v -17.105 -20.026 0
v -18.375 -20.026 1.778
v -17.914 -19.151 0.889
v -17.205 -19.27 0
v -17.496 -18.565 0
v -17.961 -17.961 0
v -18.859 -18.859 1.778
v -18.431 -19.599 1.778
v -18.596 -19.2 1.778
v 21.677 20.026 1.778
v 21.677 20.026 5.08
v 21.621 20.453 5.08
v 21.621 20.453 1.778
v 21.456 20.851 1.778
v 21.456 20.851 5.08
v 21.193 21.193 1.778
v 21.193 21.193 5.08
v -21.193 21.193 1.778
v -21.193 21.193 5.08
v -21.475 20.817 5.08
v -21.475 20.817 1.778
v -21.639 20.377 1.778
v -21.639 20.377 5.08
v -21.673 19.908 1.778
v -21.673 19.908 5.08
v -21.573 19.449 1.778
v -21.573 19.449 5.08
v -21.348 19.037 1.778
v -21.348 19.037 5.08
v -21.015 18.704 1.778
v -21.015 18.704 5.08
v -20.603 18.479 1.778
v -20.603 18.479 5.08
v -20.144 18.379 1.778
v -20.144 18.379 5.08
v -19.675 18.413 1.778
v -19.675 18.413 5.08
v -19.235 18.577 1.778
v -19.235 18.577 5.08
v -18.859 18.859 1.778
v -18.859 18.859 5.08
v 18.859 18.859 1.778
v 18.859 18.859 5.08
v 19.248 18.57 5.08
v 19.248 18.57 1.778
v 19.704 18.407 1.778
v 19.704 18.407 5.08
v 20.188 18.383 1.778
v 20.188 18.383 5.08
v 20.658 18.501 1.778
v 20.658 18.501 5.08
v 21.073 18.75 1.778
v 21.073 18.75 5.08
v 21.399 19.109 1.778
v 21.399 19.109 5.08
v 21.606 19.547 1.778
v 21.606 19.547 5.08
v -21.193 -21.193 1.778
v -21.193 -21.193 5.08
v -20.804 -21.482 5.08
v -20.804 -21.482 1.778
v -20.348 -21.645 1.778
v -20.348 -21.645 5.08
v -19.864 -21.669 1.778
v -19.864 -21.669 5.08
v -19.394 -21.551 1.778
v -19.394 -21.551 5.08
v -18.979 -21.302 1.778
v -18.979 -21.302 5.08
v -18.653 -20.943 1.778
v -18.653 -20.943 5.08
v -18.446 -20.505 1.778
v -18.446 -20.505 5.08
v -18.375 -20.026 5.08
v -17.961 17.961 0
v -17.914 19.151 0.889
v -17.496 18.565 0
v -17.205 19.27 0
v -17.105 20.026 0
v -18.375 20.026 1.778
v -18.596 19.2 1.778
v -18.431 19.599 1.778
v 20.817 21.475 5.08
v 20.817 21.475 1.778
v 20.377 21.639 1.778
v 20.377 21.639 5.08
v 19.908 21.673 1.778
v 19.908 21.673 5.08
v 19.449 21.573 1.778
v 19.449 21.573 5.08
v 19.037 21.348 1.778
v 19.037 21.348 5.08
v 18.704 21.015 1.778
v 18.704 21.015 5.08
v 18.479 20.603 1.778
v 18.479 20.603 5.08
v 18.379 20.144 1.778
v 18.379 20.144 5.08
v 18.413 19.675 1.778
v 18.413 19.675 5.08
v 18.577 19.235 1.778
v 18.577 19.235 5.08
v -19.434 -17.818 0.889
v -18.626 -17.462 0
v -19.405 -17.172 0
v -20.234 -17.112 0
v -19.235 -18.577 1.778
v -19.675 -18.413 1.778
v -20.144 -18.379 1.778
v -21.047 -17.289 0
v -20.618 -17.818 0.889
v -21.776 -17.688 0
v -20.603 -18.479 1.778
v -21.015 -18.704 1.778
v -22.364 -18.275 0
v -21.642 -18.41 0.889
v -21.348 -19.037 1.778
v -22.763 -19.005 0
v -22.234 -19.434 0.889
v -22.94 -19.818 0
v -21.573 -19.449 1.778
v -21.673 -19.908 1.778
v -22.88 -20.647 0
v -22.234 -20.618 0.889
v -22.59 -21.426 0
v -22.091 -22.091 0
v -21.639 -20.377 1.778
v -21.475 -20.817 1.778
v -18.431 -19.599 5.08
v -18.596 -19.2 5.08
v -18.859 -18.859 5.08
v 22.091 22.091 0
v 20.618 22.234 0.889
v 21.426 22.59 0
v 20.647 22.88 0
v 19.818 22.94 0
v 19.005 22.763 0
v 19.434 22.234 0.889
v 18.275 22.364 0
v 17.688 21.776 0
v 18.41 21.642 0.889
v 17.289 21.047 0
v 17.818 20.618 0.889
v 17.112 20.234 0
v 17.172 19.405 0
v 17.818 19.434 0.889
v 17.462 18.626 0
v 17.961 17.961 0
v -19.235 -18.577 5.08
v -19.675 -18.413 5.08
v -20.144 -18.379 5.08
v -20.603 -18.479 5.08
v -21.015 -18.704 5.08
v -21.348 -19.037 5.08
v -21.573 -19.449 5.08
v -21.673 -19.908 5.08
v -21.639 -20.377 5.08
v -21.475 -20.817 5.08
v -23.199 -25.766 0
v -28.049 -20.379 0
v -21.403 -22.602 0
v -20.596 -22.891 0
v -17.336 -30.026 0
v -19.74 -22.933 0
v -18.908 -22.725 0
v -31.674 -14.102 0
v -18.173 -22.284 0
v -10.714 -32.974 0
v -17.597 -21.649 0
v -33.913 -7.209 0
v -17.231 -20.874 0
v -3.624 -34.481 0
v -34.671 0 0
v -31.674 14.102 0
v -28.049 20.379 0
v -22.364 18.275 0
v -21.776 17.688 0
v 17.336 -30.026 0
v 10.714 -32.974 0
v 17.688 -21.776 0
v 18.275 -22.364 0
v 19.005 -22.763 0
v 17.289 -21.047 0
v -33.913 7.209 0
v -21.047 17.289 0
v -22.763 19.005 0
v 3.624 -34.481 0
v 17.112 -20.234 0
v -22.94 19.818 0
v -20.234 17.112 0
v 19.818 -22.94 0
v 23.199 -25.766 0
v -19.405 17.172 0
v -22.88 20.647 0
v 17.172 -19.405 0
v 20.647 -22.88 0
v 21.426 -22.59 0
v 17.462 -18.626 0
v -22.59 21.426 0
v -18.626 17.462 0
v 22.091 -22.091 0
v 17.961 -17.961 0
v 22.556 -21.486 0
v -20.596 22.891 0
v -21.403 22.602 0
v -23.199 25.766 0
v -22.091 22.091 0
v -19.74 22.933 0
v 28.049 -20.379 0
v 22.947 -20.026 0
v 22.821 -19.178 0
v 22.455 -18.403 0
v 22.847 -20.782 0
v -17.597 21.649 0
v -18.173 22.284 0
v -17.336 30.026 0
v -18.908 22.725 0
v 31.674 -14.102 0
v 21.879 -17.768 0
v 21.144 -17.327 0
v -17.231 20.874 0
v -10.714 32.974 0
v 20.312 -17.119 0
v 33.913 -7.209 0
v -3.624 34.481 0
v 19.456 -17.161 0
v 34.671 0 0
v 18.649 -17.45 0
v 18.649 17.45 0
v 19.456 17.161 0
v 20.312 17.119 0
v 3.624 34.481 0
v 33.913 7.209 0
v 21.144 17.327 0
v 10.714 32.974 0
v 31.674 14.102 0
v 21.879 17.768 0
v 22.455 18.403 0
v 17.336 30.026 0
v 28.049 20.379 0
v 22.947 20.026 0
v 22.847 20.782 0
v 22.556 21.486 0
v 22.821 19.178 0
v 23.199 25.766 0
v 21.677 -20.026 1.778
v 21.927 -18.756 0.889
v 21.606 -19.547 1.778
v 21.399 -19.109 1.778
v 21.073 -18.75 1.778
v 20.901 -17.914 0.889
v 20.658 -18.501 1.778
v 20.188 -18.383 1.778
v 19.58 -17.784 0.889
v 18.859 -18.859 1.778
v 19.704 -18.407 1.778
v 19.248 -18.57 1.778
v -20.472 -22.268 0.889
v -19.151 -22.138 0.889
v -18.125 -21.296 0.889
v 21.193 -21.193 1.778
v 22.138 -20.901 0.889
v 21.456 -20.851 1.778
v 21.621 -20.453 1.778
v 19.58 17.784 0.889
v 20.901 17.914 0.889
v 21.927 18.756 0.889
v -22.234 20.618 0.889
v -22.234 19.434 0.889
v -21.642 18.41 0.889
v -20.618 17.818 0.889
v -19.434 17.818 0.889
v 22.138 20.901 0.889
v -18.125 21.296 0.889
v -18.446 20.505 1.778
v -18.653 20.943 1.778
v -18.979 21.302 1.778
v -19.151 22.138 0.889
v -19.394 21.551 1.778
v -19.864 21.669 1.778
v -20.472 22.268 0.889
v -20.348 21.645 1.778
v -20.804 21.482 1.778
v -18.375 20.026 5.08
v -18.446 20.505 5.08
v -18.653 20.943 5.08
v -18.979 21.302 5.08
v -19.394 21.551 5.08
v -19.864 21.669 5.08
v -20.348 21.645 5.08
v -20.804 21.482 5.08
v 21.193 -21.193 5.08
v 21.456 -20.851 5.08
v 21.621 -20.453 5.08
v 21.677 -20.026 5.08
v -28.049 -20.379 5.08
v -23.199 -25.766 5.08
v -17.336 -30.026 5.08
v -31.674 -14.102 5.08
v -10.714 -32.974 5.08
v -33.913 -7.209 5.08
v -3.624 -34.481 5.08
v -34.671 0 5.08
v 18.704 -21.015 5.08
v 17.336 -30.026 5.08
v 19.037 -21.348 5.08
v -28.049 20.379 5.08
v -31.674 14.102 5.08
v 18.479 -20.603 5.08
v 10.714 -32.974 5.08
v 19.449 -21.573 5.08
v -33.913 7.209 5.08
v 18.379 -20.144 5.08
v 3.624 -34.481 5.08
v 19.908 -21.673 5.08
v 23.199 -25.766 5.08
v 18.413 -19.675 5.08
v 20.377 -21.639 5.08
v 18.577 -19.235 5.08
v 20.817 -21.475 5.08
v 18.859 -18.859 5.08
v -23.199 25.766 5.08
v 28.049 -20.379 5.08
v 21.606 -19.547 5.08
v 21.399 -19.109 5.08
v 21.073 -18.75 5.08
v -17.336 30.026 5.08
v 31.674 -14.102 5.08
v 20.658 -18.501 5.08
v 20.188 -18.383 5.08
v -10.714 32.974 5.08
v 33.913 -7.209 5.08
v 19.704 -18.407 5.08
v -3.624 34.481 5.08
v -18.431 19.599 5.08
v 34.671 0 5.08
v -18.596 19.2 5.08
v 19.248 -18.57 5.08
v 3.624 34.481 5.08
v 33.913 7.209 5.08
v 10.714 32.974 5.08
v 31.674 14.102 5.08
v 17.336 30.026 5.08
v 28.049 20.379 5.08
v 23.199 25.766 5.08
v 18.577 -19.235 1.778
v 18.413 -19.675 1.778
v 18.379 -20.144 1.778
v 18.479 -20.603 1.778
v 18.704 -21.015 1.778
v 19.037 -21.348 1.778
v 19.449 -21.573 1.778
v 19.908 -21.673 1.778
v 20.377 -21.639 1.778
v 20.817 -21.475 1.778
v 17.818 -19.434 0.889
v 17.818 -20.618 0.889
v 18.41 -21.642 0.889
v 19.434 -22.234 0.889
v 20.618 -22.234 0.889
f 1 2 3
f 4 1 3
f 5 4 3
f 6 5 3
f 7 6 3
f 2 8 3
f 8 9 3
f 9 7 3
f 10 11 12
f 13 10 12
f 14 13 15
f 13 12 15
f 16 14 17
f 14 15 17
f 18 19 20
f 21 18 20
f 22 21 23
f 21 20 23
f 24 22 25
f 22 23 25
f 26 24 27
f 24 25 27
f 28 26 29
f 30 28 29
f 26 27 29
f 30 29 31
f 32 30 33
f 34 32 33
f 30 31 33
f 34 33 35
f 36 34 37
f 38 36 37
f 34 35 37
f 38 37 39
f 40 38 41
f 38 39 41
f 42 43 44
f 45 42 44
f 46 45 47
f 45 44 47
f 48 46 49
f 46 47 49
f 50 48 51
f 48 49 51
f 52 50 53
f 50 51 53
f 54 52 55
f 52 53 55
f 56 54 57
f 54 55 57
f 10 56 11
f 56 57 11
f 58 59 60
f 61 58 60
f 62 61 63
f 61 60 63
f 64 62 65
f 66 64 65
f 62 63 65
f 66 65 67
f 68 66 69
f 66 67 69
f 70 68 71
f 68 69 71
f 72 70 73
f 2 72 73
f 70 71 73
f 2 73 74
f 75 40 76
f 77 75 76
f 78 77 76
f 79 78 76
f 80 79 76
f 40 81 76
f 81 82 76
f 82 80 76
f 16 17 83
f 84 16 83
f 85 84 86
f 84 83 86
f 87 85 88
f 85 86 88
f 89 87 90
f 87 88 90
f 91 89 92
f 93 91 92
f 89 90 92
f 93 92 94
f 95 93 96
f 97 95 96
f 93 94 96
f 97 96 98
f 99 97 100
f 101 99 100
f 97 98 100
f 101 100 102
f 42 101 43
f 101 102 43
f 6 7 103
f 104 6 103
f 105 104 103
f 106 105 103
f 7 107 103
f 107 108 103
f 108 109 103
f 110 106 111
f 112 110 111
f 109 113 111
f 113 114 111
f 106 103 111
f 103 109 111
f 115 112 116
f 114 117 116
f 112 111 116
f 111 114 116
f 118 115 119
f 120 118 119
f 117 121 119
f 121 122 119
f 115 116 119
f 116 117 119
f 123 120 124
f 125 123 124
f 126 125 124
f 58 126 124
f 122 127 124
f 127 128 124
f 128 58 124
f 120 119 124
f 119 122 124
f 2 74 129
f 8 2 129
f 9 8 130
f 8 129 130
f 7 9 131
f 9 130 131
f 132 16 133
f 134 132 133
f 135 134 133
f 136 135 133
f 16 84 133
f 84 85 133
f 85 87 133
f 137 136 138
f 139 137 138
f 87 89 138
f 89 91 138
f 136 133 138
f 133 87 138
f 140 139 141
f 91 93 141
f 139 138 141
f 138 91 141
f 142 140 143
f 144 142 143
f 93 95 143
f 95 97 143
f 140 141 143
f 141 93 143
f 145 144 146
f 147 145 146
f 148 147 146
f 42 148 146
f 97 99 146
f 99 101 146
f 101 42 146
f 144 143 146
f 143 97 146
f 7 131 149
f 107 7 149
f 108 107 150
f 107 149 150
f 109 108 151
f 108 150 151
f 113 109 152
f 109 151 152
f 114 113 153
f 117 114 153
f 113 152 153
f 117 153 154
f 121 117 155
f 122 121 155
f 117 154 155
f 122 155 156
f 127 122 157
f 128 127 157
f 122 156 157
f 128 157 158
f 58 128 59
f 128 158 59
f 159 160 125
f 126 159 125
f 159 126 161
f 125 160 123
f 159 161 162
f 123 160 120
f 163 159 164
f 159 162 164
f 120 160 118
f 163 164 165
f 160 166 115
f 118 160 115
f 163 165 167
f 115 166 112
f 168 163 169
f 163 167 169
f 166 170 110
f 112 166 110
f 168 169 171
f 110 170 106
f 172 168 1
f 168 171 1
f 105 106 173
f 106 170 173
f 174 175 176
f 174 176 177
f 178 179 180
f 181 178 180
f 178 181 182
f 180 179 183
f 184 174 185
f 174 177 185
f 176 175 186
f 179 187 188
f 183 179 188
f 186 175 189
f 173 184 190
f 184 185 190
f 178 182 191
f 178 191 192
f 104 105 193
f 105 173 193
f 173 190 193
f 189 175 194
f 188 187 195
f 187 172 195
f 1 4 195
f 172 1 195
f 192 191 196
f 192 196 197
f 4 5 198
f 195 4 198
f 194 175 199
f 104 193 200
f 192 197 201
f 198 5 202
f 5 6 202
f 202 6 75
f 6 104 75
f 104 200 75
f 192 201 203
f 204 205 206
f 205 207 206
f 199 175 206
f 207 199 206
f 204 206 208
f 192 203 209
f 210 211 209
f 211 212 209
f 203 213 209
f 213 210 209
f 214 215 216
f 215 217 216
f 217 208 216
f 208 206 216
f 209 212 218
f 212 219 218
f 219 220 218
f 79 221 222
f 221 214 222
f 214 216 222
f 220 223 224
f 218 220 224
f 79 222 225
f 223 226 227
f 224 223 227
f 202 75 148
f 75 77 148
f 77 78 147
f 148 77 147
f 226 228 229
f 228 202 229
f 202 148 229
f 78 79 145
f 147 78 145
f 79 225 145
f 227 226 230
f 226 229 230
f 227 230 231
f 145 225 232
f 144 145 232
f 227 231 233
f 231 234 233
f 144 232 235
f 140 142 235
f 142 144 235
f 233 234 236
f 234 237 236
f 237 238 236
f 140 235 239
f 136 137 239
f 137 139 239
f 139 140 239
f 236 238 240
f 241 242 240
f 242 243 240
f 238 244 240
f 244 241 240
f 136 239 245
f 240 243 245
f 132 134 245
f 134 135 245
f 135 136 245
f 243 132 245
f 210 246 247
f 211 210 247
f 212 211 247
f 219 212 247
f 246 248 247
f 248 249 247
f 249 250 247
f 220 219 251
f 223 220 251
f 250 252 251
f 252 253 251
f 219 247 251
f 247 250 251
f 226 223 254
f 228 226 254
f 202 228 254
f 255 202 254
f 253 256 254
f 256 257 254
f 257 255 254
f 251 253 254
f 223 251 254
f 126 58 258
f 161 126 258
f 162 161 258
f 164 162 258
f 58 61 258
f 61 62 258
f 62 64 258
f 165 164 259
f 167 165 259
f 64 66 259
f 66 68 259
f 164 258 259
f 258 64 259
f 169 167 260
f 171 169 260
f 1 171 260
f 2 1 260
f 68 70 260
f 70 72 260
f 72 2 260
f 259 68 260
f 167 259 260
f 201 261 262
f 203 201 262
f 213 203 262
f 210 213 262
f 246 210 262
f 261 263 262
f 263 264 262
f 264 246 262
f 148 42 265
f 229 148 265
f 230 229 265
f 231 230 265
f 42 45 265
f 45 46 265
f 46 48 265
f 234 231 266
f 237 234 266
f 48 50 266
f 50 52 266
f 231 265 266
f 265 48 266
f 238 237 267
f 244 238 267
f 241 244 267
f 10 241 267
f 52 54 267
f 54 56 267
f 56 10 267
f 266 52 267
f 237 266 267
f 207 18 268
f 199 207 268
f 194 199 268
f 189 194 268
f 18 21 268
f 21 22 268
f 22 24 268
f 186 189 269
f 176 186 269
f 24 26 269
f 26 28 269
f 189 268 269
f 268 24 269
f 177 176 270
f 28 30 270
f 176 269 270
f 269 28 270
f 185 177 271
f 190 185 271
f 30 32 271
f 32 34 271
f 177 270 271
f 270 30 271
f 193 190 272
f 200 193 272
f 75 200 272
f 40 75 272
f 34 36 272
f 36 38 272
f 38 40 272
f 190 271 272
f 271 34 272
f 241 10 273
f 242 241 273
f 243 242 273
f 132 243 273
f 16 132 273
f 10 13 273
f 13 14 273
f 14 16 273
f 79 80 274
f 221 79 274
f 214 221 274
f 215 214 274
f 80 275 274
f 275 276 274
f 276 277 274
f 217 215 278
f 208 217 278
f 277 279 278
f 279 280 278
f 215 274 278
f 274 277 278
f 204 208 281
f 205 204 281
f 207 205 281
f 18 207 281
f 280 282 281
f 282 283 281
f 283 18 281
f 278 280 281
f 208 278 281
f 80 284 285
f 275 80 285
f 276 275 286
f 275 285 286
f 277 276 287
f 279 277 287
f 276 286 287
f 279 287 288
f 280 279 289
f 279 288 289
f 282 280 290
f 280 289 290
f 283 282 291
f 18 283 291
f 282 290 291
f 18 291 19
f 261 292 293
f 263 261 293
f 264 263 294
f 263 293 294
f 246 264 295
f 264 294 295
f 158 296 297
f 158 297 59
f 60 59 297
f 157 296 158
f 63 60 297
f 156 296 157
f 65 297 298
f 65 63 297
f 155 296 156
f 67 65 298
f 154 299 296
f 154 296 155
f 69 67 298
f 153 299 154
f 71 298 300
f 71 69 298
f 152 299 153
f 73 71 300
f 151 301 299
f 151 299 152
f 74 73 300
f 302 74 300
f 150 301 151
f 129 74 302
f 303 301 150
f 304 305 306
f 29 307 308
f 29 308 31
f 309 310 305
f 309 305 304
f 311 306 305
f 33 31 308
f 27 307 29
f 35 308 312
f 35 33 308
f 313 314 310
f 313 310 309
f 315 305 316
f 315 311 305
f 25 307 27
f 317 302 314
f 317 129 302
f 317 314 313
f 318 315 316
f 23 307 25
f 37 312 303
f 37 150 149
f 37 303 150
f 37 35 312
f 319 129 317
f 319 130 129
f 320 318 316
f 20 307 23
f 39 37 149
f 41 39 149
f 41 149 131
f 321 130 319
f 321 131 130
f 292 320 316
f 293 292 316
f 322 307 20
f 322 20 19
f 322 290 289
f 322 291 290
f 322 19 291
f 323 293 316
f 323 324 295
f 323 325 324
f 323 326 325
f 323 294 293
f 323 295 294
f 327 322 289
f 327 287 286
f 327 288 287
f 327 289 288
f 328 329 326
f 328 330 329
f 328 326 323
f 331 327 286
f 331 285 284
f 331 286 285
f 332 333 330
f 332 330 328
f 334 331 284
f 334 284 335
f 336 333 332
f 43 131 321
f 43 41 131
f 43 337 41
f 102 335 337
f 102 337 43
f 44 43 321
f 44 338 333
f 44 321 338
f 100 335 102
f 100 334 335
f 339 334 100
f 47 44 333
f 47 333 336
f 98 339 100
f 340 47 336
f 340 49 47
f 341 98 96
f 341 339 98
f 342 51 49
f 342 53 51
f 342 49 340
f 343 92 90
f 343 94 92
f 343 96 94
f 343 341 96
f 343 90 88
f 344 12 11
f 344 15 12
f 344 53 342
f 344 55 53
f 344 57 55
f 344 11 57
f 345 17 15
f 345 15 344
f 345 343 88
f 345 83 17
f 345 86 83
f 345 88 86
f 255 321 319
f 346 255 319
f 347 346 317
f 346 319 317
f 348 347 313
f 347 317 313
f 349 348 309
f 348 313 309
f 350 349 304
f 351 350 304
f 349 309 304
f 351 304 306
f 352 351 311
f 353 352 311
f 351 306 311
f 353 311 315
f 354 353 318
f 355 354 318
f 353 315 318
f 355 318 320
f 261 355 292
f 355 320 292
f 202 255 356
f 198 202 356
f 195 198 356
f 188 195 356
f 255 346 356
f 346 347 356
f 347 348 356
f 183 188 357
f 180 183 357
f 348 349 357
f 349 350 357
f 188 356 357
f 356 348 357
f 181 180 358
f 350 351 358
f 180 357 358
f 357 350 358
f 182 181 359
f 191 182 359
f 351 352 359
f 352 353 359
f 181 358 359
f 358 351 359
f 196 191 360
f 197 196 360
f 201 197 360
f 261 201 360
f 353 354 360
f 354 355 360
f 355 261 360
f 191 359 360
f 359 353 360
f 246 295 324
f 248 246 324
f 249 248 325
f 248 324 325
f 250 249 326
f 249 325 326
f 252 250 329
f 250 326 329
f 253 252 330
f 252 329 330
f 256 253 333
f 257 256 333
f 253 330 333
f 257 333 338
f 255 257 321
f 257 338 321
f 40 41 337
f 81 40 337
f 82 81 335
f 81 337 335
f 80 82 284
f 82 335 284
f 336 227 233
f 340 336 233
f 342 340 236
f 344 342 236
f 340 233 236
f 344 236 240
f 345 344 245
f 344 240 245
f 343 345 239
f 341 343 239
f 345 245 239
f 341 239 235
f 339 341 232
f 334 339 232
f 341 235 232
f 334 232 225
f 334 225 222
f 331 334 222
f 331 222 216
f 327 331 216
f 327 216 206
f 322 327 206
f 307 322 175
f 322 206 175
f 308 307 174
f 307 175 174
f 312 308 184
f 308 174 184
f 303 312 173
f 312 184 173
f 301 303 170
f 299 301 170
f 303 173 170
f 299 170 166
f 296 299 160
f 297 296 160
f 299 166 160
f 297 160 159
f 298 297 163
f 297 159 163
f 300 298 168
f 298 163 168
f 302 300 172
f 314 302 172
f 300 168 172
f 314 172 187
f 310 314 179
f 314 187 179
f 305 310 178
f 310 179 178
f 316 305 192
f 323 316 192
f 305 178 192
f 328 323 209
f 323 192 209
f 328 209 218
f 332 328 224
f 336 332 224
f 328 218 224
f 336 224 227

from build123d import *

# Parameters (mm, degrees)
F0_R     = 34.671
F1_DEPTH = 5.08
F3_DEPTH = 25.4
F4_SIZE2 = 1.778
F4_SIZE  = 1.27


with BuildPart() as f1:
    # F0 (on Top) → F1 (new body)
    with BuildSketch(Plane.XY):
        Circle(F0_R)
    extrude(amount=F1_DEPTH)

    # F2 (on face) → F3 (cut)
    with BuildSketch(Plane.XY.offset(5.08)):
        with BuildLine():
            ThreePointArc((21.1934044457, 21.1934044457), (18.8585378542, 21.1934044457), (18.8585378542, 18.8585378542))
            Line((18.8585378542, 18.8585378542), (21.1934044457, 21.1934044457))
        make_face()
        with BuildLine():
            Line((21.1934044457, 21.1934044457), (18.8585378542, 18.8585378542))
            ThreePointArc((18.8585378542, 18.8585378542), (20.6577814968, 18.5006460418), (21.67697115, 20.02597115))
            ThreePointArc((21.67697115, 20.02597115), (21.5512962582, 20.6577814968), (21.1934044457, 21.1934044457))
        make_face()
        with BuildLine():
            ThreePointArc((-18.37497115, -20.02597115), (-18.5006460418, -19.3941608031), (-18.8585378542, -18.8585378542))
            Line((-18.8585378542, -18.8585378542), (-21.1934044457, -21.1934044457))
            ThreePointArc((-21.1934044457, -21.1934044457), (-19.3941608031, -21.5512962582), (-18.37497115, -20.02597115))
        make_face()
        with BuildLine():
            Line((-21.1934044457, -21.1934044457), (-18.8585378542, -18.8585378542))
            ThreePointArc((-18.8585378542, -18.8585378542), (-21.1934044457, -18.8585378542), (-21.1934044457, -21.1934044457))
        make_face()
        with BuildLine():
            ThreePointArc((-21.1934044457, 21.1934044457), (-21.1934044457, 18.8585378542), (-18.8585378542, 18.8585378542))
            Line((-18.8585378542, 18.8585378542), (-21.1934044457, 21.1934044457))
        make_face()
        with BuildLine():
            Line((-21.1934044457, 21.1934044457), (-18.8585378542, 18.8585378542))
            ThreePointArc((-18.8585378542, 18.8585378542), (-18.5006460418, 19.3941608031), (-18.37497115, 20.02597115))
            ThreePointArc((-18.37497115, 20.02597115), (-19.3941608031, 21.5512962582), (-21.1934044457, 21.1934044457))
        make_face()
        with BuildLine():
            ThreePointArc((21.67697115, -20.02597115), (20.6577814968, -18.5006460418), (18.8585378542, -18.8585378542))
            Line((18.8585378542, -18.8585378542), (21.1934044457, -21.1934044457))
            ThreePointArc((21.1934044457, -21.1934044457), (21.5512962582, -20.6577814968), (21.67697115, -20.02597115))
        make_face()
        with BuildLine():
            Line((21.1934044457, -21.1934044457), (18.8585378542, -18.8585378542))
            ThreePointArc((18.8585378542, -18.8585378542), (18.8585378542, -21.1934044457), (21.1934044457, -21.1934044457))
        make_face()
    extrude(amount=-F3_DEPTH, mode=Mode.SUBTRACT)

    # F4
    f4_edges = [f1.edges().sort_by_distance(p)[0] for p in [
        (-21.193404, -21.193404, 0),
        (21.193404, -21.193404, 0),
        (21.193404, 21.193404, 0),
        (-21.193404, 21.193404, 0),
    ]]
    chamfer(f4_edges, length=F4_SIZE, length2=F4_SIZE2)


solid = f1.part
